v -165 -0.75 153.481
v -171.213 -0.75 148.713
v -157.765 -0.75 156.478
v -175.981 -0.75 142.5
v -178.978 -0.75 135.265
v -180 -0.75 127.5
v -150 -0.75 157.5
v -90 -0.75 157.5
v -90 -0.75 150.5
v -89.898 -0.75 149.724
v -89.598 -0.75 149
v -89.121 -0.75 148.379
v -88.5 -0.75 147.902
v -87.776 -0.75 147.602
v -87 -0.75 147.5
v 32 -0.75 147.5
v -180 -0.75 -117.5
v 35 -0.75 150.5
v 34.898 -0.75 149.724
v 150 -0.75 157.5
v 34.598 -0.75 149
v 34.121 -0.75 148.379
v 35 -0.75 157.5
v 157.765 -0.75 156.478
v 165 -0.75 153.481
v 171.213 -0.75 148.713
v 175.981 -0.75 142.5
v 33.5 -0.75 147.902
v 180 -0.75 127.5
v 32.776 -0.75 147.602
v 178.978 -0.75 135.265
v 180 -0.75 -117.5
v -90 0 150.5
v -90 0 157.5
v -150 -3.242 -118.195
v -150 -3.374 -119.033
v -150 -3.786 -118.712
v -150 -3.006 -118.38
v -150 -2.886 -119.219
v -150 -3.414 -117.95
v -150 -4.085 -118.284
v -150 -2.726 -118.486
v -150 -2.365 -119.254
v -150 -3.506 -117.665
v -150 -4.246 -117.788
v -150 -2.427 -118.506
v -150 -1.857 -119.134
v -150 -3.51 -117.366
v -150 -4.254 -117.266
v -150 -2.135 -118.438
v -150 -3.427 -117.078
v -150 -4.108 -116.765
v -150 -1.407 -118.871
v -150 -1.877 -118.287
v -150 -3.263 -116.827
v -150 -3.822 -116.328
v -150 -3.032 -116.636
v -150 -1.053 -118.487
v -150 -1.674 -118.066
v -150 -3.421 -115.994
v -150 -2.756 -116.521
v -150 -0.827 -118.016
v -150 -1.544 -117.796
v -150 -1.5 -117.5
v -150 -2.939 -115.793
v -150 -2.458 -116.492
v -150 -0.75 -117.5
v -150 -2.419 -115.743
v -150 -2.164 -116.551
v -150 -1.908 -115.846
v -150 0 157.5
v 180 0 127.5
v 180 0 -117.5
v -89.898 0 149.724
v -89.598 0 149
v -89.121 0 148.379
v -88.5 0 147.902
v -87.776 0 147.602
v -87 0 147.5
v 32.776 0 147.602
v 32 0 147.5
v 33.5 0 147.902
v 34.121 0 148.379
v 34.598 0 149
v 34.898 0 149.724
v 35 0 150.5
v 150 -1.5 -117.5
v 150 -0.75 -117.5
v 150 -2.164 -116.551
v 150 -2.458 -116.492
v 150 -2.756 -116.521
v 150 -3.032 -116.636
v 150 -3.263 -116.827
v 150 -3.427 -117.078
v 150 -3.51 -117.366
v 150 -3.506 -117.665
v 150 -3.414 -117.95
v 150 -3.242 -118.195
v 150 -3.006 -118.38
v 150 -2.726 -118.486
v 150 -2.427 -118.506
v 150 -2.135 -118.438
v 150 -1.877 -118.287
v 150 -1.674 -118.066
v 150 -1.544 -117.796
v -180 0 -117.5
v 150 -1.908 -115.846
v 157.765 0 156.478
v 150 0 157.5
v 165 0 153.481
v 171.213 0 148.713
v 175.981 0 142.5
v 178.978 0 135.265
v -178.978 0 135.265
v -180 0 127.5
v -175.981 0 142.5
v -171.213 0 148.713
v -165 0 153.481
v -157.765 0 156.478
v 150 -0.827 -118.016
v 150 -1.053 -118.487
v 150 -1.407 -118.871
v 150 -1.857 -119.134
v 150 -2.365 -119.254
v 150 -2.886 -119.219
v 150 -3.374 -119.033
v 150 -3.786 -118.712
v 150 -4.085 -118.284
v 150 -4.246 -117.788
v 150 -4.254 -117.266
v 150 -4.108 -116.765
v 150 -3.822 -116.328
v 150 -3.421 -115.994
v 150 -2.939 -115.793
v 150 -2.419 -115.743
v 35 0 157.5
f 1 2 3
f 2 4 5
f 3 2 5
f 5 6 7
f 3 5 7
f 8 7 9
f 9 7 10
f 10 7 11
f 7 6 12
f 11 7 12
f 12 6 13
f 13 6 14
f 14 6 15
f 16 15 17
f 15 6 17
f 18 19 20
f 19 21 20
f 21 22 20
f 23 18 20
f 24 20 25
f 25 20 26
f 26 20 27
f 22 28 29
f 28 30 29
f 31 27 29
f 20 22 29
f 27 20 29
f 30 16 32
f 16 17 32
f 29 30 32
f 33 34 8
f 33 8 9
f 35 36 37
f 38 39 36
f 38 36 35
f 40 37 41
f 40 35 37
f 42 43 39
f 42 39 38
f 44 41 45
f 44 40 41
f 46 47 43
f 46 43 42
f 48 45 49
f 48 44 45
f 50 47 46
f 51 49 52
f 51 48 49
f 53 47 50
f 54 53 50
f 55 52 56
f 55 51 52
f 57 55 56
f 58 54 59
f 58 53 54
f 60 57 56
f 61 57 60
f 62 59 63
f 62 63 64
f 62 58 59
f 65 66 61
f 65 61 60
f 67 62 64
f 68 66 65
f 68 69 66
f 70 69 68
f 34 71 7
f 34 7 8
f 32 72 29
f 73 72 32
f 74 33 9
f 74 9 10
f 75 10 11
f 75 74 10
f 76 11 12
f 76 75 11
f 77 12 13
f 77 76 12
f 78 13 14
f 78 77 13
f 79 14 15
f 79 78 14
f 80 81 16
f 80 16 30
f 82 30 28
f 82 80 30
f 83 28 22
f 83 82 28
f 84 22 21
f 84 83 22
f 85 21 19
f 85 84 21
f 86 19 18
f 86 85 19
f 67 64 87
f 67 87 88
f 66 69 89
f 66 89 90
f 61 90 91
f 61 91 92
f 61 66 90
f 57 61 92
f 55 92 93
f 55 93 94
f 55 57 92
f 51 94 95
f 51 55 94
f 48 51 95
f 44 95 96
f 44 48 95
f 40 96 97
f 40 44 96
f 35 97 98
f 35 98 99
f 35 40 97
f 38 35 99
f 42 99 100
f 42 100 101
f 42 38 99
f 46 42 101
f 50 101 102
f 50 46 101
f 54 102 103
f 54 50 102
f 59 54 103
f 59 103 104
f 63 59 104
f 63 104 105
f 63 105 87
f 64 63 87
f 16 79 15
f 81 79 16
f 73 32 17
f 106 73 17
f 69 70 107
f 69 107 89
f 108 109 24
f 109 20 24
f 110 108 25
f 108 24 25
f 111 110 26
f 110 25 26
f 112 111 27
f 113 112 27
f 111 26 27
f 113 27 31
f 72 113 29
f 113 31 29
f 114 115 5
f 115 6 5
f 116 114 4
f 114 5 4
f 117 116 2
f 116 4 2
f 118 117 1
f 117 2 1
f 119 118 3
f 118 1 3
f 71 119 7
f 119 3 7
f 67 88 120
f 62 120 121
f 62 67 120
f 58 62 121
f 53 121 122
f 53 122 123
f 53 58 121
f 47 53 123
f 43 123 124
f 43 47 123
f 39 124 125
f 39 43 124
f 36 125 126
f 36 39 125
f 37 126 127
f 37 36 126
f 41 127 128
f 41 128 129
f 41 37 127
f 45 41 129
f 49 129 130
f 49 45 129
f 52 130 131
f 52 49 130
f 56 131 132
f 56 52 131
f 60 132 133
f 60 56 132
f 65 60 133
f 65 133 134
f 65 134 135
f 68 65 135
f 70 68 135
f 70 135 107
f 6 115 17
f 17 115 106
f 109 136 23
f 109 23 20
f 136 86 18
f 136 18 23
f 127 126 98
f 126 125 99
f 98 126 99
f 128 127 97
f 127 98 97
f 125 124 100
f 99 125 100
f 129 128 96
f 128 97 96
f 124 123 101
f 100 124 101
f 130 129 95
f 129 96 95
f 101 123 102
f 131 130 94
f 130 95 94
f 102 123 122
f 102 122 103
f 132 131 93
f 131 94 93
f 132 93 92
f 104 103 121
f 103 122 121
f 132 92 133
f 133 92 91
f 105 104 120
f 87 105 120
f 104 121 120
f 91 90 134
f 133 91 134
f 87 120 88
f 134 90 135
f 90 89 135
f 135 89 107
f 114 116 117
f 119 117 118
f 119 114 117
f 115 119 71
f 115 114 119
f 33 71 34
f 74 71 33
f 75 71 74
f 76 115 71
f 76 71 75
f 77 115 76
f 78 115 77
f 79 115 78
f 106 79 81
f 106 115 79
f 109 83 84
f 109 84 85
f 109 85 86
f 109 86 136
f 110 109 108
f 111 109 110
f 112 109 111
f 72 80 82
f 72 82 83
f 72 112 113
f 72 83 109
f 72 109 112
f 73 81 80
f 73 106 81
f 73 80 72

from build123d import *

# Parameters (mm, degrees)
SKETCH1_W          = 360
SKETCH1_H          = 315
BASE_FLANGE1_DEPTH = 0.75
FILLET1_R          = 30
SKETCH6_W          = 300
SKETCH6_H          = 40
CUT_EXTRUDE1_DEPTH = 10
CUT_EXTRUDE2_DEPTH = 10
BASE_FLANGE3_DEPTH = 300
CUT_EXTRUDE3_START = -10
CUT_EXTRUDE3_DEPTH = 10
CUT_EXTRUDE4_START = -10
CUT_EXTRUDE4_DEPTH = 10


# Sheet-metal steps are written as plain solids
with BuildPart() as part:
    # Sketch1 → Base-Flange1 (new body)
    with BuildSketch(Plane(origin=(0, 0, 0), x_dir=(1, 0, 0), z_dir=(0, 1, 0))):
        Rectangle(SKETCH1_W, SKETCH1_H)
    extrude(amount=-BASE_FLANGE1_DEPTH)

    # Fillet1
    fillet1_edges = [part.edges().sort_by_distance(p)[0] for p in [
        (-180, -0.375, -157.5),
        (180, -0.375, -157.5),
        (180, -0.375, 157.5),
        (-180, -0.375, 157.5),
    ]]
    fillet(fillet1_edges, radius=FILLET1_R)

    # Sketch6 → Cut-Extrude1 (cut)
    with BuildSketch(Plane(origin=(0, 0, 0), x_dir=(1, 0, 0), z_dir=(0, 1, 0))):
        with Locations((0, 137.5)):
            Rectangle(SKETCH6_W, SKETCH6_H)
    extrude(amount=-CUT_EXTRUDE1_DEPTH, mode=Mode.SUBTRACT)

    # Sketch7 → Cut-Extrude2 (cut)
    with BuildSketch(Plane(origin=(0, 0, 0), x_dir=(1, 0, 0), z_dir=(0, 1, 0))):
        with BuildLine():
            Line((-90, -157.5), (-90, -150.5))
            ThreePointArc((-90, -150.5), (-89.121320344, -148.378679656), (-87, -147.5))
            Line((-87, -147.5), (32, -147.5))
            ThreePointArc((32, -147.5), (34.121320344, -148.378679656), (35, -150.5))
            Line((35, -150.5), (35, -157.5))
            Line((35, -157.5), (-90, -157.5))
        make_face()
    extrude(amount=-CUT_EXTRUDE2_DEPTH, mode=Mode.SUBTRACT)

    # Sketch16 → Cut-Extrude3 (cut)
    with BuildSketch(Plane(origin=(0, 0, 0), x_dir=(1, 0, 0), z_dir=(0, 1, 0)).offset(CUT_EXTRUDE3_START)):
        with BuildLine():
            Line((-150, 157.5), (-150, 117.5))
            Line((-150, 117.5), (-180, 117.5))
            Line((-180, 117.5), (-180, 127.5))
            ThreePointArc((-180, 127.5), (-171.213203436, 148.713203436), (-150, 157.5))
        make_face()
    extrude(amount=CUT_EXTRUDE3_DEPTH, mode=Mode.SUBTRACT)

    # Sketch17 → Cut-Extrude4 (cut)
    with BuildSketch(Plane(origin=(0, 0, 0), x_dir=(1, 0, 0), z_dir=(0, 1, 0)).offset(CUT_EXTRUDE4_START)):
        with BuildLine():
            Line((150, 117.5), (150, 157.5))
            ThreePointArc((150, 157.5), (171.213203436, 148.713203436), (180, 127.5))
            Line((180, 127.5), (180, 117.5))
            Line((180, 117.5), (150, 117.5))
        make_face()
    extrude(amount=CUT_EXTRUDE4_DEPTH, mode=Mode.SUBTRACT)


with BuildPart() as body_2:
    # Sketch13 → Base-Flange3 (new body)
    with BuildSketch(Plane(origin=(-150, 0, 0), x_dir=(0, 0, -1), z_dir=(1, 0, 0))):
        with BuildLine():
            ThreePointArc((117.5, -0.75), (118.509330413, -3.95118709), (115.846409858, -1.907856282))
            Line((115.846409858, -1.907856282), (116.551179324, -2.16437139))
            ThreePointArc((116.551179324, -2.16437139), (118.079148085, -3.336823057), (117.5, -1.5))
            Line((117.5, -1.5), (117.5, -0.75))
        make_face()
    extrude(amount=BASE_FLANGE3_DEPTH)


solid = Compound([part.part, body_2.part])
